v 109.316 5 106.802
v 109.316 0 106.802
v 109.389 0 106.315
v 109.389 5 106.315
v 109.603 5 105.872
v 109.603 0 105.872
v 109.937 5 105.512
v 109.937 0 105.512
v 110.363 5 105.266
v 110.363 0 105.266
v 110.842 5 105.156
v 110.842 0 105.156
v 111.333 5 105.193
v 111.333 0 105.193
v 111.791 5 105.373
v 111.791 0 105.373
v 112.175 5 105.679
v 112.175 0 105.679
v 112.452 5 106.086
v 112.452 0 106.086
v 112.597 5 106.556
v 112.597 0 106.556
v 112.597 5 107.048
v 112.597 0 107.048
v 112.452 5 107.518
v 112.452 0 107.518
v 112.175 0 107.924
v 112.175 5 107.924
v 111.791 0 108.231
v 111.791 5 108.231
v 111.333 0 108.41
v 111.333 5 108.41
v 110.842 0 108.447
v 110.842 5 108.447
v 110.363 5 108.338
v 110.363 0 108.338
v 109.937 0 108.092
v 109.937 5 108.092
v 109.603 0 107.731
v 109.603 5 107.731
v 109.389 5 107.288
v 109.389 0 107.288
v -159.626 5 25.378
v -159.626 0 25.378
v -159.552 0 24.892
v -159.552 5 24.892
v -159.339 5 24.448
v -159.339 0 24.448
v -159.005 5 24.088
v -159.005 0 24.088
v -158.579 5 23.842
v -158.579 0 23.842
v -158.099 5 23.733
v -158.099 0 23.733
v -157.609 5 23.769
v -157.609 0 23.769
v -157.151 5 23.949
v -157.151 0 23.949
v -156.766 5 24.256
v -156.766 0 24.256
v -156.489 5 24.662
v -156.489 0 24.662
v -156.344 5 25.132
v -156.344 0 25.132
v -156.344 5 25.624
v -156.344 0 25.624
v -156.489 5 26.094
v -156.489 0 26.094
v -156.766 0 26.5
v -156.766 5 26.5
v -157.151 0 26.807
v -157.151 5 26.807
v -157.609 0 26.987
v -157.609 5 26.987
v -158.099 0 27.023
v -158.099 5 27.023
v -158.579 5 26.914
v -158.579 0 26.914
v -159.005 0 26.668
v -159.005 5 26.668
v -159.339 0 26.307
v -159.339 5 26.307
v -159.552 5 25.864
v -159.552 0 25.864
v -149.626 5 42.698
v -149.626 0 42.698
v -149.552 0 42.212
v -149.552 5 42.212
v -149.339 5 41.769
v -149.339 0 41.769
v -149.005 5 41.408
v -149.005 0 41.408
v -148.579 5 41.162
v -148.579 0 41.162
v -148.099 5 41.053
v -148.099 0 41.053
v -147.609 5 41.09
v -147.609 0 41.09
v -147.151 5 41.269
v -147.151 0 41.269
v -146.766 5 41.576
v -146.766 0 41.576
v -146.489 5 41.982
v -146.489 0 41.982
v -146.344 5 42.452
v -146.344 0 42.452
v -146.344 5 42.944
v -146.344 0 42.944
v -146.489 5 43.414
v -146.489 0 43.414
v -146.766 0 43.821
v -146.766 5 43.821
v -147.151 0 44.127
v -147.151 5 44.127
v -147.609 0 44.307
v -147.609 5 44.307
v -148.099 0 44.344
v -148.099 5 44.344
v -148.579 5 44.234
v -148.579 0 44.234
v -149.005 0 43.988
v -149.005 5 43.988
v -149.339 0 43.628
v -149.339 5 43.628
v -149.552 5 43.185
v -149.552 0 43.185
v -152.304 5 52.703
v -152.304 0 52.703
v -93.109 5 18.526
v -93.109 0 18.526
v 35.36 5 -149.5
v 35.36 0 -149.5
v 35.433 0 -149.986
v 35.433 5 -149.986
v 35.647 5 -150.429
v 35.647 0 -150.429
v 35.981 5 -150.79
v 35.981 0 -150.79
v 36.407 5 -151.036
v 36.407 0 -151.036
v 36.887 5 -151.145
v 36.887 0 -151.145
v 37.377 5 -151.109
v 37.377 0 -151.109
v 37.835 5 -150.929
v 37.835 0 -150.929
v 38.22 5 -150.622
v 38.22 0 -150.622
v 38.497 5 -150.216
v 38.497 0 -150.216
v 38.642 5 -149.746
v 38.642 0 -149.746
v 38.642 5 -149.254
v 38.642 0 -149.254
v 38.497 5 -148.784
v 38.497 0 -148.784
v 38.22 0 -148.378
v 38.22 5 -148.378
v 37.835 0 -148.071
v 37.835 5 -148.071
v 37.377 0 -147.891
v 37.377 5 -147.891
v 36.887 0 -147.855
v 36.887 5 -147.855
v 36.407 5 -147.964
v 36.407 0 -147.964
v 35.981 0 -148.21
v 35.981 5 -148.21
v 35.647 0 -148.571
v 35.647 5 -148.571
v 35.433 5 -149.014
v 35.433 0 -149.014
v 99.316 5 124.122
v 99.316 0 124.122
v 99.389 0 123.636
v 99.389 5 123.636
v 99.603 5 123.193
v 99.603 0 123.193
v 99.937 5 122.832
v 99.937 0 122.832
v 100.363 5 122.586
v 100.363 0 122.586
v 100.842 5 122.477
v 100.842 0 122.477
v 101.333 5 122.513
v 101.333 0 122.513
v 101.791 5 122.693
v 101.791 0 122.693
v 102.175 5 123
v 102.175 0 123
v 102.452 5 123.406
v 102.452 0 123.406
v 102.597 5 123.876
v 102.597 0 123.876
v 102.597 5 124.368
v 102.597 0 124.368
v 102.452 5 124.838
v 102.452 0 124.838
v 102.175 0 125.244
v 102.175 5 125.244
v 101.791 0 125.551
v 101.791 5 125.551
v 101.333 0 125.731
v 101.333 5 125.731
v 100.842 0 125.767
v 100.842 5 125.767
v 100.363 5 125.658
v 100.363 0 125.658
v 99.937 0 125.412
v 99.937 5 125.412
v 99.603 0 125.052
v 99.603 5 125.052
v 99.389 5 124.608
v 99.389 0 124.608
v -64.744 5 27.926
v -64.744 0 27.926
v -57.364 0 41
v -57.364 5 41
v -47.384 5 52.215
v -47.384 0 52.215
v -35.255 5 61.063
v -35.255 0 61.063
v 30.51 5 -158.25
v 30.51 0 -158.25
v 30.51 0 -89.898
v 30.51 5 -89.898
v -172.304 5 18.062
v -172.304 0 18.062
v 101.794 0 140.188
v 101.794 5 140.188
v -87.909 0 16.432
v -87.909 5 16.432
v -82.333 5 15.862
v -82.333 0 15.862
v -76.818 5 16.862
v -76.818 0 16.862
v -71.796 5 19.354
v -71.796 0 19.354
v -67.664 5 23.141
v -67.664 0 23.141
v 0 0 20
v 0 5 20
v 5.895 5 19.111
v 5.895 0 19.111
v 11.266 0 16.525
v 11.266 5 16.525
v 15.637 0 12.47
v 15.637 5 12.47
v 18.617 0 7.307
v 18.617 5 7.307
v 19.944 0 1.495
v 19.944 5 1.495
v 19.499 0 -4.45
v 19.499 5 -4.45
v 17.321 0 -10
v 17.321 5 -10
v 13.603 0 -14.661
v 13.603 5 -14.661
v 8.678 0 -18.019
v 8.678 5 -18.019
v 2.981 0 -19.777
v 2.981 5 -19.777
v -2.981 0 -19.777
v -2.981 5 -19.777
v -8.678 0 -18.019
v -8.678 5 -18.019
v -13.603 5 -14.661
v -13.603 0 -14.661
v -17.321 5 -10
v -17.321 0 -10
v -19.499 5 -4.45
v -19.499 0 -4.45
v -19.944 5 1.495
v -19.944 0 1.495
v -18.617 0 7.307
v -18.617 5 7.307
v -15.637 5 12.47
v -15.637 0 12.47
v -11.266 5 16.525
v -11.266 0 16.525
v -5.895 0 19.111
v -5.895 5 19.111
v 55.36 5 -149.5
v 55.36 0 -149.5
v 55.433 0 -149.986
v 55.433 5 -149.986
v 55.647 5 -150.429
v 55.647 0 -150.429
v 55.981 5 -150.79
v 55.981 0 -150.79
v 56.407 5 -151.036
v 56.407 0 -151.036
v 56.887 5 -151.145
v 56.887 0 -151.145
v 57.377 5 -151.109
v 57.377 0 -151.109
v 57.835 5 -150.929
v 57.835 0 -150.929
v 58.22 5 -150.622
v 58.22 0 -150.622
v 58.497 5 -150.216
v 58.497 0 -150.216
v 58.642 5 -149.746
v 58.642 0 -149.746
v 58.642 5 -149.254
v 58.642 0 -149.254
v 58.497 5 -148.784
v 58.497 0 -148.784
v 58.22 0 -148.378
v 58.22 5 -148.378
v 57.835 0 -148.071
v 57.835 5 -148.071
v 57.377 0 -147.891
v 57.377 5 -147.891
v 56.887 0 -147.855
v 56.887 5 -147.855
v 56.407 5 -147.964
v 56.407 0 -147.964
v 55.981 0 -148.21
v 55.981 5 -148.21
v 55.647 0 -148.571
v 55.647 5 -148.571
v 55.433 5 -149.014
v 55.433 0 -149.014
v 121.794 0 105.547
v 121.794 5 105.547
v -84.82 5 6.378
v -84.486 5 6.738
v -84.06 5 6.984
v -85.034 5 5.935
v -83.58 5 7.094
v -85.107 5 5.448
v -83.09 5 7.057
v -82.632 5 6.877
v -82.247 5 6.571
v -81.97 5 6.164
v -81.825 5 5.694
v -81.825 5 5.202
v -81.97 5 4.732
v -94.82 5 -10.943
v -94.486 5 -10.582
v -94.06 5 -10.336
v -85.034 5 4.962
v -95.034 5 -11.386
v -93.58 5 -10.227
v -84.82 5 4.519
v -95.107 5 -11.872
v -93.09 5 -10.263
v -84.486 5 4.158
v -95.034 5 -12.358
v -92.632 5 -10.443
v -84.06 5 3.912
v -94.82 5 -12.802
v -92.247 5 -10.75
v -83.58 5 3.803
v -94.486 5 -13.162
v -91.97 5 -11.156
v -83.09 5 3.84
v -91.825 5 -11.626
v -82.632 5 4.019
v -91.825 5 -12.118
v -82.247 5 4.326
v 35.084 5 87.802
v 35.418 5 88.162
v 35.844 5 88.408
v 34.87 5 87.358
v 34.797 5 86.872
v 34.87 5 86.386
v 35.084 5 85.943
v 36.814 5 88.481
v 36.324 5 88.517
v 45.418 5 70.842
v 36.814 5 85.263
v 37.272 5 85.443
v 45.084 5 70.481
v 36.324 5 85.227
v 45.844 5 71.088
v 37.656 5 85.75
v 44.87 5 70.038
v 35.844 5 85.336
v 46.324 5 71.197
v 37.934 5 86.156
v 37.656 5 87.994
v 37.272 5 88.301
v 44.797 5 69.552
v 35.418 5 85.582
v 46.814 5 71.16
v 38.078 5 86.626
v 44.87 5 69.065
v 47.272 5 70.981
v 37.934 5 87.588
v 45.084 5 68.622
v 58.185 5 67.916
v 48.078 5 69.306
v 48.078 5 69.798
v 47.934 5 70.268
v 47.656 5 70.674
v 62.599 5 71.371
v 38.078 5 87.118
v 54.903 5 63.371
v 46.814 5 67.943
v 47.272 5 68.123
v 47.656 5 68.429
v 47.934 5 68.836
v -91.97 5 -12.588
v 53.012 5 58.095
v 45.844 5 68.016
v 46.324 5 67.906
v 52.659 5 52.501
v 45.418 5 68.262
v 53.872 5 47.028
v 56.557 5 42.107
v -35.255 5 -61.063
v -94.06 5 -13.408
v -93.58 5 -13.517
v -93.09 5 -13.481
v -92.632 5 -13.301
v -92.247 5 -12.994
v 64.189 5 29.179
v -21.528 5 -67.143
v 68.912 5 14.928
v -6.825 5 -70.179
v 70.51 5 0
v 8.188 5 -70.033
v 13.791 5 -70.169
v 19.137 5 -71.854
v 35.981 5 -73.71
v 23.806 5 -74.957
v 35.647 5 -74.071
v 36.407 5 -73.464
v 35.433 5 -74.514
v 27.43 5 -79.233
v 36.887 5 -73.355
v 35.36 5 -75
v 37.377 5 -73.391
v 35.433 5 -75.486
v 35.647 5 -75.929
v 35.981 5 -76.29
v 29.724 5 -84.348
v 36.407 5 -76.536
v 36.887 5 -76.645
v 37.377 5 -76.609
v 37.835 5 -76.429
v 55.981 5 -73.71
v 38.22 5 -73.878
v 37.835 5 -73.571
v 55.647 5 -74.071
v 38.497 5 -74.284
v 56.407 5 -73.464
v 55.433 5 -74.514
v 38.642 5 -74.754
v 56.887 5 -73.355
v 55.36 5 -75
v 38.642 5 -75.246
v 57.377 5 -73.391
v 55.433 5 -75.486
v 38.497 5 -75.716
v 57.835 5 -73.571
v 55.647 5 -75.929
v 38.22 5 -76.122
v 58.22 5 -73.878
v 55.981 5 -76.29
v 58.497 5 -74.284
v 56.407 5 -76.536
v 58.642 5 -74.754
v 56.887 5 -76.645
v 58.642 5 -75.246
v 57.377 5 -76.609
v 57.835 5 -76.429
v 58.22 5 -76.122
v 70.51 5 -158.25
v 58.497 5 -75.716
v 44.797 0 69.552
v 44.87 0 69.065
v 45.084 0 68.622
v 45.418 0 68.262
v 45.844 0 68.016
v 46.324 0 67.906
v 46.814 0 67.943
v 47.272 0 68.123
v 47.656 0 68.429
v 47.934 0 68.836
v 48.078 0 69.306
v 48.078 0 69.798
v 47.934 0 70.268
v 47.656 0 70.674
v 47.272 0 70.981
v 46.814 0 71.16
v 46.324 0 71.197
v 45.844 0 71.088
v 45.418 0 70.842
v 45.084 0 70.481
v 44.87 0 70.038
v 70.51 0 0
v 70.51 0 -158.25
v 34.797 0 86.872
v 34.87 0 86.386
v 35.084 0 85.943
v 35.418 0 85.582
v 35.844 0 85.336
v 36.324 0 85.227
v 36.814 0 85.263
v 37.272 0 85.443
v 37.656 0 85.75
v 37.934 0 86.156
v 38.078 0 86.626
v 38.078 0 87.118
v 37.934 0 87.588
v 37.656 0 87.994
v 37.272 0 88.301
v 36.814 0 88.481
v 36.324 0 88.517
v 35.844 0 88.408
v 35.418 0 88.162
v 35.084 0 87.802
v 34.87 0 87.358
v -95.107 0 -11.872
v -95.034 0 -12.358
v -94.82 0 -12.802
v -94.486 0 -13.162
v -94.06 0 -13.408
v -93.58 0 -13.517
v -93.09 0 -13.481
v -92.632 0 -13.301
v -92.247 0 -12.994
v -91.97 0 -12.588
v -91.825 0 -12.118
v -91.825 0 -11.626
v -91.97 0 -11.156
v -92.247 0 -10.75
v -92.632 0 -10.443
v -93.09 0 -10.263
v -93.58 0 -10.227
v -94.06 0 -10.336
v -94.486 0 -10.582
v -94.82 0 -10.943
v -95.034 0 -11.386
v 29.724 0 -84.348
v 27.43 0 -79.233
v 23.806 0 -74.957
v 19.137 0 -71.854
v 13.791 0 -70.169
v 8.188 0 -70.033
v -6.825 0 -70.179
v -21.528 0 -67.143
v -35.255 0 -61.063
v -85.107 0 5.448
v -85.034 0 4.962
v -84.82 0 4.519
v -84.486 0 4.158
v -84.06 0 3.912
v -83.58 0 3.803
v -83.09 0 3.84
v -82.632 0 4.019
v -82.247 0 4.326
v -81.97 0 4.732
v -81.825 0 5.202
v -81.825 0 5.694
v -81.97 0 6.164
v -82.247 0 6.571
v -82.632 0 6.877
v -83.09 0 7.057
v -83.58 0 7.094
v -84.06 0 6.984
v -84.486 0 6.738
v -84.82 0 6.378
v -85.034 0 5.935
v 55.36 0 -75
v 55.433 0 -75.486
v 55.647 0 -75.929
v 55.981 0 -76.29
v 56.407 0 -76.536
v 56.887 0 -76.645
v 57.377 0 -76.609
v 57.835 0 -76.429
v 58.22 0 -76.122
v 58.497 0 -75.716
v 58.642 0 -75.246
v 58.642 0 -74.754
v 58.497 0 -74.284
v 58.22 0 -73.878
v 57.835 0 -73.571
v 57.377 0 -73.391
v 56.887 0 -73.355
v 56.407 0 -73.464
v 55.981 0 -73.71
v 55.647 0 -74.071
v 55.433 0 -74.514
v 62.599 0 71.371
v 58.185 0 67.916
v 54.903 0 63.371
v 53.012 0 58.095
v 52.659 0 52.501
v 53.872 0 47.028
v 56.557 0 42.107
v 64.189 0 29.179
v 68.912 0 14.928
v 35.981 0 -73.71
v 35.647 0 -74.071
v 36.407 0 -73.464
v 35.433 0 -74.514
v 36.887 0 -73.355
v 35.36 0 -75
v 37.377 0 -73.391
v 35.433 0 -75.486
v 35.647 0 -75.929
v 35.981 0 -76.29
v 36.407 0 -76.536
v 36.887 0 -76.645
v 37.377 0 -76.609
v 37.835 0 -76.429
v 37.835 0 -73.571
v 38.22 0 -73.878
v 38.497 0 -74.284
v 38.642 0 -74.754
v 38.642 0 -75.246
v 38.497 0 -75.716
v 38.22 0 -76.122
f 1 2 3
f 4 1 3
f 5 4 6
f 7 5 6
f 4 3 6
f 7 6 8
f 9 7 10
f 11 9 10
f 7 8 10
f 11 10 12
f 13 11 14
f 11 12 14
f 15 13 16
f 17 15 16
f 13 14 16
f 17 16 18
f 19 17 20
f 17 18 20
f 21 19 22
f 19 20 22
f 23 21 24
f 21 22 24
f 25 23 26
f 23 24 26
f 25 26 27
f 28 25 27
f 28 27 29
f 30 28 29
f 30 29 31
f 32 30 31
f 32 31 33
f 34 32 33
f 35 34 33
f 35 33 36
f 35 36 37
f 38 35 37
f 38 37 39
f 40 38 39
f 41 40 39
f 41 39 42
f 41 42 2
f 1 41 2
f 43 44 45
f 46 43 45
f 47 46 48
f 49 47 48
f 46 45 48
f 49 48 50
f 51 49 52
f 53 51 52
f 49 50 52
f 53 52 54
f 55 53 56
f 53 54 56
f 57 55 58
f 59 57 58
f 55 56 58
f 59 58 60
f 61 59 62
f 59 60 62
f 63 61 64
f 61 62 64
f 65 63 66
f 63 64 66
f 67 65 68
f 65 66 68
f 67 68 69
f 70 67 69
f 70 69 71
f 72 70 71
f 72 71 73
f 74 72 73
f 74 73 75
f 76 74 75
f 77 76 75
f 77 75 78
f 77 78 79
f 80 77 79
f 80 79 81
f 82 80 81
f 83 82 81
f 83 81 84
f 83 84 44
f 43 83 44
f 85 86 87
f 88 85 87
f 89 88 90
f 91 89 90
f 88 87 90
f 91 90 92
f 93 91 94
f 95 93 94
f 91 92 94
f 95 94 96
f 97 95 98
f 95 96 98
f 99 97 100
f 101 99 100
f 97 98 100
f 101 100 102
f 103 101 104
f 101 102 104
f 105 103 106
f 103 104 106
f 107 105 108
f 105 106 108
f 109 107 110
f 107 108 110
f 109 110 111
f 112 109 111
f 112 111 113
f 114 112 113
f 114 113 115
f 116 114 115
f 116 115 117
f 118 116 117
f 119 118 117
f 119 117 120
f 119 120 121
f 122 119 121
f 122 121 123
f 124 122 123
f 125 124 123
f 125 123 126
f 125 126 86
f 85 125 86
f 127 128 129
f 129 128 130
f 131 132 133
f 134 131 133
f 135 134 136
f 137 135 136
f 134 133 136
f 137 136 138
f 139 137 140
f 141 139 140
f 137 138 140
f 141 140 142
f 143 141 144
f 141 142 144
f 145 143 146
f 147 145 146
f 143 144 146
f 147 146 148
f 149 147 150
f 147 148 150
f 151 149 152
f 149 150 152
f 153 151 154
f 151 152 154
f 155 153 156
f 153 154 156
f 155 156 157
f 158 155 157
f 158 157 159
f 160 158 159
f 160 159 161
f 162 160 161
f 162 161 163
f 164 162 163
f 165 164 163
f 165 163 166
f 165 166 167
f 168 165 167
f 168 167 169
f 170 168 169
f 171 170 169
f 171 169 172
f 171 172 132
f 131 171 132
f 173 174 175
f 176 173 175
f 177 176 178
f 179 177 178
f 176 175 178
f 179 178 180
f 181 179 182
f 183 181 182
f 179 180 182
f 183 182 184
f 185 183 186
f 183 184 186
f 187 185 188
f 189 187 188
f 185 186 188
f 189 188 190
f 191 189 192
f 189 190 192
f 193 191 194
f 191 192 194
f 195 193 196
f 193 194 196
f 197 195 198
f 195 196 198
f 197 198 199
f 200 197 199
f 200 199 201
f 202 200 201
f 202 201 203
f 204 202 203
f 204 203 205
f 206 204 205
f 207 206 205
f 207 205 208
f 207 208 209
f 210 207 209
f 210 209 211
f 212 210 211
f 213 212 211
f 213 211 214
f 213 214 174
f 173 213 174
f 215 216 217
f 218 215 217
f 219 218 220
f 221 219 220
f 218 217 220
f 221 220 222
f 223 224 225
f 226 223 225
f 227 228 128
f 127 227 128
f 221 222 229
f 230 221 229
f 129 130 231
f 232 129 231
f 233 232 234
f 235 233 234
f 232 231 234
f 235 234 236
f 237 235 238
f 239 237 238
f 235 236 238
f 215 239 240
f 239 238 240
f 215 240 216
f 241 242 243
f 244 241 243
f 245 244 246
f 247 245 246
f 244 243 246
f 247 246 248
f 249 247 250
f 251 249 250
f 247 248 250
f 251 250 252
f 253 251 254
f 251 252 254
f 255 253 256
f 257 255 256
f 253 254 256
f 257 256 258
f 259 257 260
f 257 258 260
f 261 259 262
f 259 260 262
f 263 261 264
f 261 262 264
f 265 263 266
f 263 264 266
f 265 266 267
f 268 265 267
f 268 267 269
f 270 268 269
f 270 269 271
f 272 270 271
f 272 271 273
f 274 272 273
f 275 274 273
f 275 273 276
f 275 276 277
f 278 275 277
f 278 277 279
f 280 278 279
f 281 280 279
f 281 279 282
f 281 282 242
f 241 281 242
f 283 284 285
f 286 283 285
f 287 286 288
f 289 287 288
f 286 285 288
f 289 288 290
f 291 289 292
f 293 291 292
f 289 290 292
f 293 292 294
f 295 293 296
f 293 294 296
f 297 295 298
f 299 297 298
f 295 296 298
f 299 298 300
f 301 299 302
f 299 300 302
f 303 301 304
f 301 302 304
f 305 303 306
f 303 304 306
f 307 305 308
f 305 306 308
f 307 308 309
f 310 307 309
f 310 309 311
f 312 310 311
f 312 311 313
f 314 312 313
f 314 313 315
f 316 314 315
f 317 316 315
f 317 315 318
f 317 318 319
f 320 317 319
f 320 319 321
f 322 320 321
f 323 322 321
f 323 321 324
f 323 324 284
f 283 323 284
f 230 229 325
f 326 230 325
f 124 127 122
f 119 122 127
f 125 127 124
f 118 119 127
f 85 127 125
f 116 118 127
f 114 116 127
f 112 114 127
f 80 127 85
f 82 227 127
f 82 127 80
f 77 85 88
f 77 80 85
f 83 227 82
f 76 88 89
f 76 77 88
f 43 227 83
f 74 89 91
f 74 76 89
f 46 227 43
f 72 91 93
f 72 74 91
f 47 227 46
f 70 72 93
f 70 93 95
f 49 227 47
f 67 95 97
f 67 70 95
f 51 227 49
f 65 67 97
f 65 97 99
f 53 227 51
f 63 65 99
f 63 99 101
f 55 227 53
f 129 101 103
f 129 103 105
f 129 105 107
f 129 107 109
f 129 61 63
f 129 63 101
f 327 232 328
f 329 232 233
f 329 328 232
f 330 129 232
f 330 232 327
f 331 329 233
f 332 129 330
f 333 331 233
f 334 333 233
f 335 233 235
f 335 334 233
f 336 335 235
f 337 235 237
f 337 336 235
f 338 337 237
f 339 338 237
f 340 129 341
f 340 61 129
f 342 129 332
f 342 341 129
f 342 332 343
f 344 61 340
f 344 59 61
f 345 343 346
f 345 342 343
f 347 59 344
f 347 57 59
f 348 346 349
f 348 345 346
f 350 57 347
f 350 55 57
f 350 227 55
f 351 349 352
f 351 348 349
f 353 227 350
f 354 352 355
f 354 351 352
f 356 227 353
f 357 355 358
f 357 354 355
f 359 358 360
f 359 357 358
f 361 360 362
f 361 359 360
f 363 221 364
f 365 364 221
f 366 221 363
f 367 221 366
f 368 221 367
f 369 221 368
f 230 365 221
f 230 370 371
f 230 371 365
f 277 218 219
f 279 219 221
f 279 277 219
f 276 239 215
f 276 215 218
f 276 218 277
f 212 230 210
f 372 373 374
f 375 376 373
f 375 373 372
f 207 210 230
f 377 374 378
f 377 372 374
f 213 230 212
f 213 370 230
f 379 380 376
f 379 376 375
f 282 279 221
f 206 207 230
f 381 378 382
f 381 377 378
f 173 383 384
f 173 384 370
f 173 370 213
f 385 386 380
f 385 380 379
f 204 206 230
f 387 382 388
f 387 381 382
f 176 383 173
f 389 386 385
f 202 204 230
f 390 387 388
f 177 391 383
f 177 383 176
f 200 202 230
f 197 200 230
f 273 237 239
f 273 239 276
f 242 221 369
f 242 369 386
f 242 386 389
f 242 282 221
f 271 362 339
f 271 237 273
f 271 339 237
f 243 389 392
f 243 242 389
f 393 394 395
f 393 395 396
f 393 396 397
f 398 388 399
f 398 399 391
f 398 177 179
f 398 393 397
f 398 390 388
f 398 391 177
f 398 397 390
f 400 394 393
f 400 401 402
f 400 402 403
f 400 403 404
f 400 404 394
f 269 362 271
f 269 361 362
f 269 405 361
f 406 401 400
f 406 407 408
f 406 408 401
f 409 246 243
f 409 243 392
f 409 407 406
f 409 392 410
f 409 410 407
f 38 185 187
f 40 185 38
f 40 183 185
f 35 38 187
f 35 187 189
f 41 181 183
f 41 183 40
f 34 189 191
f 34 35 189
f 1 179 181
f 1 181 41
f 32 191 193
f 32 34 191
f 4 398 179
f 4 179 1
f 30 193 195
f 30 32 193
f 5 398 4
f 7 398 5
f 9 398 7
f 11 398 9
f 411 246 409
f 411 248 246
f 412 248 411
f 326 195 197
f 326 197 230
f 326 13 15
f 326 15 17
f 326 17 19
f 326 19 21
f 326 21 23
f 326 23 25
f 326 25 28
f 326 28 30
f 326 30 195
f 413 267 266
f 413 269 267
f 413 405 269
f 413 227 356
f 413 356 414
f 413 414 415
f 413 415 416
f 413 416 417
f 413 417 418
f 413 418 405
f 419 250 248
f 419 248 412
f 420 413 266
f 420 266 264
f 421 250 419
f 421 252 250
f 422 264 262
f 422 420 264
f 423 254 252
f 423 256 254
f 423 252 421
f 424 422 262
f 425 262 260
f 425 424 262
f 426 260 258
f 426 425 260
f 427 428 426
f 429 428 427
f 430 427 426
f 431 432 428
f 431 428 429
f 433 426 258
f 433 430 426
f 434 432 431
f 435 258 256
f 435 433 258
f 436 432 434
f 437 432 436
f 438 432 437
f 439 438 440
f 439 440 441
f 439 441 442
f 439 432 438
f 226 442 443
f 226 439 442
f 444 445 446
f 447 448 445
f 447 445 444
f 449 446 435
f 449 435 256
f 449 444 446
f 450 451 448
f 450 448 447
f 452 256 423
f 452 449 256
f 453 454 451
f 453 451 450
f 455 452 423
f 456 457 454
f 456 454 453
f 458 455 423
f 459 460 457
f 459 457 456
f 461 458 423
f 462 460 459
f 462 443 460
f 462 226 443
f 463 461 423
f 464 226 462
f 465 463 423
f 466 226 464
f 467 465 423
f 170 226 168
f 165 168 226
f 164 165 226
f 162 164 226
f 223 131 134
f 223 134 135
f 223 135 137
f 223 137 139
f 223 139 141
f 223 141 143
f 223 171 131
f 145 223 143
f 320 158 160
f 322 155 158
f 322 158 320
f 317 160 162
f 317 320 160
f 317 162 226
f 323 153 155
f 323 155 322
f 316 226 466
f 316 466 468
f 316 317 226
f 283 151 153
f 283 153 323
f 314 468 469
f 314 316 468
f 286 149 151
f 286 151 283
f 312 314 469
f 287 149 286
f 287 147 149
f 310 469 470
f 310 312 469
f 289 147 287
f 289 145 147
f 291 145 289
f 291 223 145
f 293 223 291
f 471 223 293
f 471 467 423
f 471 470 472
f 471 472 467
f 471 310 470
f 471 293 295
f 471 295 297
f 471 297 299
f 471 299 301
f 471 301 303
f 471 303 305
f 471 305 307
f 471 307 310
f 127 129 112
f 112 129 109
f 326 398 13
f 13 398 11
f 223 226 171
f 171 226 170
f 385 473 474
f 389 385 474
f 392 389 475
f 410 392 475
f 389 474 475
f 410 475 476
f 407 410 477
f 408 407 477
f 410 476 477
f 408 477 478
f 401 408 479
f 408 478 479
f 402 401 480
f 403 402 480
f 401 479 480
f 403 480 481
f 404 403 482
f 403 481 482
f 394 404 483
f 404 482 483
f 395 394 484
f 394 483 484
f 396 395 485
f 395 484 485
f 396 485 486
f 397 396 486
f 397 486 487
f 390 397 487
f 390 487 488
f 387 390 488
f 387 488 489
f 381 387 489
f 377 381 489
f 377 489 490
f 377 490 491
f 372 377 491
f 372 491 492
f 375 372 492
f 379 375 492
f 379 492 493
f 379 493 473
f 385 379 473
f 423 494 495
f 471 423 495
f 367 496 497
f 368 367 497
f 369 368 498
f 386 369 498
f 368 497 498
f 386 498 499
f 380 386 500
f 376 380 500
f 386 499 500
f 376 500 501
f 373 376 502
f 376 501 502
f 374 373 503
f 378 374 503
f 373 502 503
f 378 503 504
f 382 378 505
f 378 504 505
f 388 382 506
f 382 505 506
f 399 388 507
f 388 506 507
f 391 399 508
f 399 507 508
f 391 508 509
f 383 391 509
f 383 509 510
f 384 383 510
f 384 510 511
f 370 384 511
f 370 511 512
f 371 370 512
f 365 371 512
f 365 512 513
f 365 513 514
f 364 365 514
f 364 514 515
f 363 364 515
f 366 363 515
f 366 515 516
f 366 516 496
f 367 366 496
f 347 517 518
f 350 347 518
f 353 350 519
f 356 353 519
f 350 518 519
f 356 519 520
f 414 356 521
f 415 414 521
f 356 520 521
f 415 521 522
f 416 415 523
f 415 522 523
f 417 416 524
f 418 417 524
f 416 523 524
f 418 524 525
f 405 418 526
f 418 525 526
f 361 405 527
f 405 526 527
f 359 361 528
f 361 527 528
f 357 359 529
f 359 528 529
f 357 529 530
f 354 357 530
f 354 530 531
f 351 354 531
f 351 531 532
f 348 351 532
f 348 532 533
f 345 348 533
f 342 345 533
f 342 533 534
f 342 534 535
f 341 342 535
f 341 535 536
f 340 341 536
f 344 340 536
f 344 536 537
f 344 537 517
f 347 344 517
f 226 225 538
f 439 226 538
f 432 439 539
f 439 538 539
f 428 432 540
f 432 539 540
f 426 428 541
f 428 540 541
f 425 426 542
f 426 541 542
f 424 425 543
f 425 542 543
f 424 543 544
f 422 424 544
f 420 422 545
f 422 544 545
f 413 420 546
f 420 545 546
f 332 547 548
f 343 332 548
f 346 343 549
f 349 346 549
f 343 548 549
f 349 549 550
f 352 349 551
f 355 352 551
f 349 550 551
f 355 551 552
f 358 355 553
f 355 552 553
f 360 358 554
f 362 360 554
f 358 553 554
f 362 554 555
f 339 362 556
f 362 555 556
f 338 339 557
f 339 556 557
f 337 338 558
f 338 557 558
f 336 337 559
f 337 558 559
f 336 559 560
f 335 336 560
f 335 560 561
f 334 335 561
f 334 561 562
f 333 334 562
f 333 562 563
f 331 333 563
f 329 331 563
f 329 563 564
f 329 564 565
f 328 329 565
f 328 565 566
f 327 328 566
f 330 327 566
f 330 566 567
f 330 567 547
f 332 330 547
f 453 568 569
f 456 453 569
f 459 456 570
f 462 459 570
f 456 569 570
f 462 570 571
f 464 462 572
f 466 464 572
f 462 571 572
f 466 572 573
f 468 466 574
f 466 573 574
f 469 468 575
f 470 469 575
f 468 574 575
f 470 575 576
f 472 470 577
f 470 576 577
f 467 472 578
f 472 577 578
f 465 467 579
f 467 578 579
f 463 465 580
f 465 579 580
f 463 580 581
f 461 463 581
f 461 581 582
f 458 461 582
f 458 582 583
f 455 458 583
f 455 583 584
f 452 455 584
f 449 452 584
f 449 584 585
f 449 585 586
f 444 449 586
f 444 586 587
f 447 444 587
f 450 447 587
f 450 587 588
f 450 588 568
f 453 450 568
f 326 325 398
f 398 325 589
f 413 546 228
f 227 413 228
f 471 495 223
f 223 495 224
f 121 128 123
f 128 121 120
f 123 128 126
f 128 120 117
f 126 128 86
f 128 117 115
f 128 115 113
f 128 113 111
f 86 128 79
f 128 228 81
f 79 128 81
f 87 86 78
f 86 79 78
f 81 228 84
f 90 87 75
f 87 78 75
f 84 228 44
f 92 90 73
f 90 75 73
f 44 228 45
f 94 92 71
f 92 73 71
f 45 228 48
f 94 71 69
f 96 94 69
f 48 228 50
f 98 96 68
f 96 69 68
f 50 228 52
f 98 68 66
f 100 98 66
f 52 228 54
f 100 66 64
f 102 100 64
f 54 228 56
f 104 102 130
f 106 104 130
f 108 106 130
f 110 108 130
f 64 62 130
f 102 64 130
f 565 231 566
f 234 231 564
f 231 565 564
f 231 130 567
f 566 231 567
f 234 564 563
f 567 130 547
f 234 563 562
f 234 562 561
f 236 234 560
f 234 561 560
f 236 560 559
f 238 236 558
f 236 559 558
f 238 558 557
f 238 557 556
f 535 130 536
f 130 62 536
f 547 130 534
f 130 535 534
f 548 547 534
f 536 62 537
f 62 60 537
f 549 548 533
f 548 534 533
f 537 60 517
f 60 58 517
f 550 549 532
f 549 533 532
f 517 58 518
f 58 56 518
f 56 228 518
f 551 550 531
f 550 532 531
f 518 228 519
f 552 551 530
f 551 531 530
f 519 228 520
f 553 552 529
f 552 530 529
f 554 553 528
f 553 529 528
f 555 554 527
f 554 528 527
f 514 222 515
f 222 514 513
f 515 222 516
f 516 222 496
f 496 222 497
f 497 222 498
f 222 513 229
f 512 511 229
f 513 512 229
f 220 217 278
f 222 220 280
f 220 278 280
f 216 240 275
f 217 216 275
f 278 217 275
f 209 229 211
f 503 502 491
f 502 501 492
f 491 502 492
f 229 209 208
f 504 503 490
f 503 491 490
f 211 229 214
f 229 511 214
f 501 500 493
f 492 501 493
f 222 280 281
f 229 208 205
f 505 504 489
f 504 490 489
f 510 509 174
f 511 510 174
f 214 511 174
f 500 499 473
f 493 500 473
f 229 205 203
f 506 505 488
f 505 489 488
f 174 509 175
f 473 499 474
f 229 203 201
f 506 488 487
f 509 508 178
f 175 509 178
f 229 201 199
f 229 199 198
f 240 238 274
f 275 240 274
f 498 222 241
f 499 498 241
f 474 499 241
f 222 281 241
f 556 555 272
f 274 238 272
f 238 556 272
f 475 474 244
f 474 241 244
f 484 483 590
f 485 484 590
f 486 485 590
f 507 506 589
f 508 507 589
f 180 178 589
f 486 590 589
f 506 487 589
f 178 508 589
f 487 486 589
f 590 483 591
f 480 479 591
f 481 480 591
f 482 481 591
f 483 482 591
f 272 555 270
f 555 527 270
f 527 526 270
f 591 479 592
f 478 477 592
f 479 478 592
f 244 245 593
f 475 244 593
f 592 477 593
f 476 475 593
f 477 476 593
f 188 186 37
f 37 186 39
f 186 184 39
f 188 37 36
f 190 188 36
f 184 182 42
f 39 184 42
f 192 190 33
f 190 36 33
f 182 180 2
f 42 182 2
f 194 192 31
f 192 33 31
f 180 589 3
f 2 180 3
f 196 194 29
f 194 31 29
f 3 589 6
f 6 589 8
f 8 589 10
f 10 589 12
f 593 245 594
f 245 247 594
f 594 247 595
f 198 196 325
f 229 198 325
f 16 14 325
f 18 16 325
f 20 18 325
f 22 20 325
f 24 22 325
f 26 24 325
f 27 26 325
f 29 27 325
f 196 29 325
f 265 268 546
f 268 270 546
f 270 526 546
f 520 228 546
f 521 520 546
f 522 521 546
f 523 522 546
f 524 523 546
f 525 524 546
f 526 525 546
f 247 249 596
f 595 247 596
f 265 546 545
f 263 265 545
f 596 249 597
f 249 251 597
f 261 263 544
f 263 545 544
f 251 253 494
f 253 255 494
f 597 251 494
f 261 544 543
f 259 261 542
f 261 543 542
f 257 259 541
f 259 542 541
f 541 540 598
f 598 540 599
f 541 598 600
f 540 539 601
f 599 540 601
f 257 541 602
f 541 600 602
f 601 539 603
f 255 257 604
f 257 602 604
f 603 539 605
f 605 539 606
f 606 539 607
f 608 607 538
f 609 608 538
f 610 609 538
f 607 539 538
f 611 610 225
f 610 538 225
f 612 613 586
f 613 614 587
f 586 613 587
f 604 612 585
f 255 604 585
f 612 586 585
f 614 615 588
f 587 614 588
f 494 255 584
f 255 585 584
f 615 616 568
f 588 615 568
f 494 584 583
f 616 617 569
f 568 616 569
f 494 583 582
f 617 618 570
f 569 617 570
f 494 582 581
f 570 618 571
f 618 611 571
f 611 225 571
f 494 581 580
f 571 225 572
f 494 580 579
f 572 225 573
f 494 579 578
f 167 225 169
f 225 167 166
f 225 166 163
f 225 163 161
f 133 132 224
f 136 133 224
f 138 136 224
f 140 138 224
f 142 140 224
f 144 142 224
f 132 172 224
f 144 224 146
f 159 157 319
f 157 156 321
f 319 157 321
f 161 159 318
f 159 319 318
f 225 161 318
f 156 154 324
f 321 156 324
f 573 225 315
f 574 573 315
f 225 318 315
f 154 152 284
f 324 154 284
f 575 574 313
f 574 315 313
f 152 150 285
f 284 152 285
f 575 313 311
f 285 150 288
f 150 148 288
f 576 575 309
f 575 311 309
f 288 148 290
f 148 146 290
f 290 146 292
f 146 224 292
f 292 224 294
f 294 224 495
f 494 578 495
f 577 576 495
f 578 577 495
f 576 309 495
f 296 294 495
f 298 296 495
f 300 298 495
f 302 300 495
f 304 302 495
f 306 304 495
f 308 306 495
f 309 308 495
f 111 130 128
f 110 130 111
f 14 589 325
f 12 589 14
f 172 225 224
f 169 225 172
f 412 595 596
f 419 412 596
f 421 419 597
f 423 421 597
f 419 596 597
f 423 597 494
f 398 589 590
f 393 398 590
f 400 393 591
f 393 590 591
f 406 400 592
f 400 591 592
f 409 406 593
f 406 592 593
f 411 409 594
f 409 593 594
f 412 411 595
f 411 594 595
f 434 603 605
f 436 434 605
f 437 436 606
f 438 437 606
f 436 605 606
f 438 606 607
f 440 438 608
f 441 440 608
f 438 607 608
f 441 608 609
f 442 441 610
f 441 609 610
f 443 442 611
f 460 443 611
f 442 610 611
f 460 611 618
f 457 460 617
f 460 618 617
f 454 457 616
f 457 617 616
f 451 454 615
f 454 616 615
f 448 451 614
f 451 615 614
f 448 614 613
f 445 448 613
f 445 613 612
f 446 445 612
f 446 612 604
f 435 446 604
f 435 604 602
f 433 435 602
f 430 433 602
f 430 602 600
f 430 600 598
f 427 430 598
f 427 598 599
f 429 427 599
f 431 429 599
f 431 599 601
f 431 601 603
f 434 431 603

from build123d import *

# Parameters (mm, degrees)
SKETCH_2_R          = 70.51
EXTRUDE_1_DEPTH     = 5
SKETCH_3_R          = 20
CUT_EXTRUDE_1_DEPTH = 235.001208449
HOLE_WIZARD_M4_1_D  = 3.3


with BuildPart() as part:
    # 스케치2 → 보스-돌출1 (new body)
    with BuildSketch(Plane(origin=(0, 0, 0), x_dir=(1, 0, 0), z_dir=(0, 1, 0))):
        with BuildLine():
            ThreePointArc((-70.305885551, -5.361208523), (-62.360516315, 32.906323175), (-35.255, 61.063451221))
            Line((-35.255, 61.063451221), (-172.303520149, -18.061548779))
            Line((-172.303520149, -18.061548779), (-152.303520149, -52.702564931))
            Line((-152.303520149, -52.702564931), (-93.108708968, -18.52642476))
            Line((-93.108708968, -18.52642476), (-70.305885551, -5.361208523))
        make_face()
        with BuildLine():
            ThreePointArc((-64.74417268, -27.925833988), (-68.461084842, -16.874239606), (-70.305885551, -5.361208523))
            Line((-70.305885551, -5.361208523), (-93.108708968, -18.52642476))
            ThreePointArc((-93.108708968, -18.52642476), (-76.817557222, -16.862165002), (-64.74417268, -27.925833988))
        make_face()
        Circle(SKETCH_2_R)
        with BuildLine():
            Line((62.598708968, -71.371294899), (39.795885551, -58.206078662))
            ThreePointArc((39.795885551, -58.206078662), (2.682546343, -70.45895291), (-35.255, -61.063451221))
            Line((-35.255, -61.063451221), (101.793520149, -140.188451221))
            Line((101.793520149, -140.188451221), (121.793520149, -105.547435069))
            Line((121.793520149, -105.547435069), (62.598708968, -71.371294899))
        make_face()
        with BuildLine():
            ThreePointArc((62.598708968, -71.371294899), (53.011841866, -58.09487351), (56.556567996, -42.107181294))
            ThreePointArc((56.556567996, -42.107181294), (48.84406259, -50.85191884), (39.795885551, -58.206078662))
            Line((39.795885551, -58.206078662), (62.598708968, -71.371294899))
        make_face()
        with BuildLine():
            Line((30.51, 89.89771966), (30.51, 63.567287185))
            ThreePointArc((30.51, 63.567287185), (59.677969972, 37.552629735), (70.51, 0))
            Line((70.51, 0), (70.51, 158.25))
            Line((70.51, 158.25), (30.51, 158.25))
            Line((30.51, 158.25), (30.51, 89.89771966))
        make_face()
        with BuildLine():
            ThreePointArc((8.187604685, 70.033015282), (19.617022252, 67.726158447), (30.51, 63.567287185))
            Line((30.51, 63.567287185), (30.51, 89.89771966))
            ThreePointArc((30.51, 89.89771966), (23.805715357, 74.957038512), (8.187604685, 70.033015282))
        make_face()
    extrude(amount=EXTRUDE_1_DEPTH)

    # 스케치3 → 컷-돌출1 (cut, through all)
    with BuildSketch(Plane(origin=(0, 5, 0), x_dir=(1, 0, 0), z_dir=(0, 1, 0))):
        with Locations(Location((0, 0, 0), (0, 0, 270))):
            Circle(SKETCH_3_R)
    extrude(amount=-CUT_EXTRUDE_1_DEPTH, mode=Mode.SUBTRACT)

    # M4 나사 구멍1 (through all)
    with Locations(Plane(origin=(0, 5, 0), x_dir=(1, 0, 0), z_dir=(0, 1, 0))):
        with Locations((57.01, 149.5), (37.01, 75), (37.01, 149.5), (57.01, 75), (100.965797866, -124.12210827), (46.446905284, -69.551600194), (110.965797866, -106.801600194), (36.446905284, -86.87210827), (-157.975797866, -25.37789173), (-83.456905284, -5.448399806), (-147.975797866, -42.698399806), (-93.456905284, 11.87210827)):
            Hole(HOLE_WIZARD_M4_1_D / 2)


solid = part.part
